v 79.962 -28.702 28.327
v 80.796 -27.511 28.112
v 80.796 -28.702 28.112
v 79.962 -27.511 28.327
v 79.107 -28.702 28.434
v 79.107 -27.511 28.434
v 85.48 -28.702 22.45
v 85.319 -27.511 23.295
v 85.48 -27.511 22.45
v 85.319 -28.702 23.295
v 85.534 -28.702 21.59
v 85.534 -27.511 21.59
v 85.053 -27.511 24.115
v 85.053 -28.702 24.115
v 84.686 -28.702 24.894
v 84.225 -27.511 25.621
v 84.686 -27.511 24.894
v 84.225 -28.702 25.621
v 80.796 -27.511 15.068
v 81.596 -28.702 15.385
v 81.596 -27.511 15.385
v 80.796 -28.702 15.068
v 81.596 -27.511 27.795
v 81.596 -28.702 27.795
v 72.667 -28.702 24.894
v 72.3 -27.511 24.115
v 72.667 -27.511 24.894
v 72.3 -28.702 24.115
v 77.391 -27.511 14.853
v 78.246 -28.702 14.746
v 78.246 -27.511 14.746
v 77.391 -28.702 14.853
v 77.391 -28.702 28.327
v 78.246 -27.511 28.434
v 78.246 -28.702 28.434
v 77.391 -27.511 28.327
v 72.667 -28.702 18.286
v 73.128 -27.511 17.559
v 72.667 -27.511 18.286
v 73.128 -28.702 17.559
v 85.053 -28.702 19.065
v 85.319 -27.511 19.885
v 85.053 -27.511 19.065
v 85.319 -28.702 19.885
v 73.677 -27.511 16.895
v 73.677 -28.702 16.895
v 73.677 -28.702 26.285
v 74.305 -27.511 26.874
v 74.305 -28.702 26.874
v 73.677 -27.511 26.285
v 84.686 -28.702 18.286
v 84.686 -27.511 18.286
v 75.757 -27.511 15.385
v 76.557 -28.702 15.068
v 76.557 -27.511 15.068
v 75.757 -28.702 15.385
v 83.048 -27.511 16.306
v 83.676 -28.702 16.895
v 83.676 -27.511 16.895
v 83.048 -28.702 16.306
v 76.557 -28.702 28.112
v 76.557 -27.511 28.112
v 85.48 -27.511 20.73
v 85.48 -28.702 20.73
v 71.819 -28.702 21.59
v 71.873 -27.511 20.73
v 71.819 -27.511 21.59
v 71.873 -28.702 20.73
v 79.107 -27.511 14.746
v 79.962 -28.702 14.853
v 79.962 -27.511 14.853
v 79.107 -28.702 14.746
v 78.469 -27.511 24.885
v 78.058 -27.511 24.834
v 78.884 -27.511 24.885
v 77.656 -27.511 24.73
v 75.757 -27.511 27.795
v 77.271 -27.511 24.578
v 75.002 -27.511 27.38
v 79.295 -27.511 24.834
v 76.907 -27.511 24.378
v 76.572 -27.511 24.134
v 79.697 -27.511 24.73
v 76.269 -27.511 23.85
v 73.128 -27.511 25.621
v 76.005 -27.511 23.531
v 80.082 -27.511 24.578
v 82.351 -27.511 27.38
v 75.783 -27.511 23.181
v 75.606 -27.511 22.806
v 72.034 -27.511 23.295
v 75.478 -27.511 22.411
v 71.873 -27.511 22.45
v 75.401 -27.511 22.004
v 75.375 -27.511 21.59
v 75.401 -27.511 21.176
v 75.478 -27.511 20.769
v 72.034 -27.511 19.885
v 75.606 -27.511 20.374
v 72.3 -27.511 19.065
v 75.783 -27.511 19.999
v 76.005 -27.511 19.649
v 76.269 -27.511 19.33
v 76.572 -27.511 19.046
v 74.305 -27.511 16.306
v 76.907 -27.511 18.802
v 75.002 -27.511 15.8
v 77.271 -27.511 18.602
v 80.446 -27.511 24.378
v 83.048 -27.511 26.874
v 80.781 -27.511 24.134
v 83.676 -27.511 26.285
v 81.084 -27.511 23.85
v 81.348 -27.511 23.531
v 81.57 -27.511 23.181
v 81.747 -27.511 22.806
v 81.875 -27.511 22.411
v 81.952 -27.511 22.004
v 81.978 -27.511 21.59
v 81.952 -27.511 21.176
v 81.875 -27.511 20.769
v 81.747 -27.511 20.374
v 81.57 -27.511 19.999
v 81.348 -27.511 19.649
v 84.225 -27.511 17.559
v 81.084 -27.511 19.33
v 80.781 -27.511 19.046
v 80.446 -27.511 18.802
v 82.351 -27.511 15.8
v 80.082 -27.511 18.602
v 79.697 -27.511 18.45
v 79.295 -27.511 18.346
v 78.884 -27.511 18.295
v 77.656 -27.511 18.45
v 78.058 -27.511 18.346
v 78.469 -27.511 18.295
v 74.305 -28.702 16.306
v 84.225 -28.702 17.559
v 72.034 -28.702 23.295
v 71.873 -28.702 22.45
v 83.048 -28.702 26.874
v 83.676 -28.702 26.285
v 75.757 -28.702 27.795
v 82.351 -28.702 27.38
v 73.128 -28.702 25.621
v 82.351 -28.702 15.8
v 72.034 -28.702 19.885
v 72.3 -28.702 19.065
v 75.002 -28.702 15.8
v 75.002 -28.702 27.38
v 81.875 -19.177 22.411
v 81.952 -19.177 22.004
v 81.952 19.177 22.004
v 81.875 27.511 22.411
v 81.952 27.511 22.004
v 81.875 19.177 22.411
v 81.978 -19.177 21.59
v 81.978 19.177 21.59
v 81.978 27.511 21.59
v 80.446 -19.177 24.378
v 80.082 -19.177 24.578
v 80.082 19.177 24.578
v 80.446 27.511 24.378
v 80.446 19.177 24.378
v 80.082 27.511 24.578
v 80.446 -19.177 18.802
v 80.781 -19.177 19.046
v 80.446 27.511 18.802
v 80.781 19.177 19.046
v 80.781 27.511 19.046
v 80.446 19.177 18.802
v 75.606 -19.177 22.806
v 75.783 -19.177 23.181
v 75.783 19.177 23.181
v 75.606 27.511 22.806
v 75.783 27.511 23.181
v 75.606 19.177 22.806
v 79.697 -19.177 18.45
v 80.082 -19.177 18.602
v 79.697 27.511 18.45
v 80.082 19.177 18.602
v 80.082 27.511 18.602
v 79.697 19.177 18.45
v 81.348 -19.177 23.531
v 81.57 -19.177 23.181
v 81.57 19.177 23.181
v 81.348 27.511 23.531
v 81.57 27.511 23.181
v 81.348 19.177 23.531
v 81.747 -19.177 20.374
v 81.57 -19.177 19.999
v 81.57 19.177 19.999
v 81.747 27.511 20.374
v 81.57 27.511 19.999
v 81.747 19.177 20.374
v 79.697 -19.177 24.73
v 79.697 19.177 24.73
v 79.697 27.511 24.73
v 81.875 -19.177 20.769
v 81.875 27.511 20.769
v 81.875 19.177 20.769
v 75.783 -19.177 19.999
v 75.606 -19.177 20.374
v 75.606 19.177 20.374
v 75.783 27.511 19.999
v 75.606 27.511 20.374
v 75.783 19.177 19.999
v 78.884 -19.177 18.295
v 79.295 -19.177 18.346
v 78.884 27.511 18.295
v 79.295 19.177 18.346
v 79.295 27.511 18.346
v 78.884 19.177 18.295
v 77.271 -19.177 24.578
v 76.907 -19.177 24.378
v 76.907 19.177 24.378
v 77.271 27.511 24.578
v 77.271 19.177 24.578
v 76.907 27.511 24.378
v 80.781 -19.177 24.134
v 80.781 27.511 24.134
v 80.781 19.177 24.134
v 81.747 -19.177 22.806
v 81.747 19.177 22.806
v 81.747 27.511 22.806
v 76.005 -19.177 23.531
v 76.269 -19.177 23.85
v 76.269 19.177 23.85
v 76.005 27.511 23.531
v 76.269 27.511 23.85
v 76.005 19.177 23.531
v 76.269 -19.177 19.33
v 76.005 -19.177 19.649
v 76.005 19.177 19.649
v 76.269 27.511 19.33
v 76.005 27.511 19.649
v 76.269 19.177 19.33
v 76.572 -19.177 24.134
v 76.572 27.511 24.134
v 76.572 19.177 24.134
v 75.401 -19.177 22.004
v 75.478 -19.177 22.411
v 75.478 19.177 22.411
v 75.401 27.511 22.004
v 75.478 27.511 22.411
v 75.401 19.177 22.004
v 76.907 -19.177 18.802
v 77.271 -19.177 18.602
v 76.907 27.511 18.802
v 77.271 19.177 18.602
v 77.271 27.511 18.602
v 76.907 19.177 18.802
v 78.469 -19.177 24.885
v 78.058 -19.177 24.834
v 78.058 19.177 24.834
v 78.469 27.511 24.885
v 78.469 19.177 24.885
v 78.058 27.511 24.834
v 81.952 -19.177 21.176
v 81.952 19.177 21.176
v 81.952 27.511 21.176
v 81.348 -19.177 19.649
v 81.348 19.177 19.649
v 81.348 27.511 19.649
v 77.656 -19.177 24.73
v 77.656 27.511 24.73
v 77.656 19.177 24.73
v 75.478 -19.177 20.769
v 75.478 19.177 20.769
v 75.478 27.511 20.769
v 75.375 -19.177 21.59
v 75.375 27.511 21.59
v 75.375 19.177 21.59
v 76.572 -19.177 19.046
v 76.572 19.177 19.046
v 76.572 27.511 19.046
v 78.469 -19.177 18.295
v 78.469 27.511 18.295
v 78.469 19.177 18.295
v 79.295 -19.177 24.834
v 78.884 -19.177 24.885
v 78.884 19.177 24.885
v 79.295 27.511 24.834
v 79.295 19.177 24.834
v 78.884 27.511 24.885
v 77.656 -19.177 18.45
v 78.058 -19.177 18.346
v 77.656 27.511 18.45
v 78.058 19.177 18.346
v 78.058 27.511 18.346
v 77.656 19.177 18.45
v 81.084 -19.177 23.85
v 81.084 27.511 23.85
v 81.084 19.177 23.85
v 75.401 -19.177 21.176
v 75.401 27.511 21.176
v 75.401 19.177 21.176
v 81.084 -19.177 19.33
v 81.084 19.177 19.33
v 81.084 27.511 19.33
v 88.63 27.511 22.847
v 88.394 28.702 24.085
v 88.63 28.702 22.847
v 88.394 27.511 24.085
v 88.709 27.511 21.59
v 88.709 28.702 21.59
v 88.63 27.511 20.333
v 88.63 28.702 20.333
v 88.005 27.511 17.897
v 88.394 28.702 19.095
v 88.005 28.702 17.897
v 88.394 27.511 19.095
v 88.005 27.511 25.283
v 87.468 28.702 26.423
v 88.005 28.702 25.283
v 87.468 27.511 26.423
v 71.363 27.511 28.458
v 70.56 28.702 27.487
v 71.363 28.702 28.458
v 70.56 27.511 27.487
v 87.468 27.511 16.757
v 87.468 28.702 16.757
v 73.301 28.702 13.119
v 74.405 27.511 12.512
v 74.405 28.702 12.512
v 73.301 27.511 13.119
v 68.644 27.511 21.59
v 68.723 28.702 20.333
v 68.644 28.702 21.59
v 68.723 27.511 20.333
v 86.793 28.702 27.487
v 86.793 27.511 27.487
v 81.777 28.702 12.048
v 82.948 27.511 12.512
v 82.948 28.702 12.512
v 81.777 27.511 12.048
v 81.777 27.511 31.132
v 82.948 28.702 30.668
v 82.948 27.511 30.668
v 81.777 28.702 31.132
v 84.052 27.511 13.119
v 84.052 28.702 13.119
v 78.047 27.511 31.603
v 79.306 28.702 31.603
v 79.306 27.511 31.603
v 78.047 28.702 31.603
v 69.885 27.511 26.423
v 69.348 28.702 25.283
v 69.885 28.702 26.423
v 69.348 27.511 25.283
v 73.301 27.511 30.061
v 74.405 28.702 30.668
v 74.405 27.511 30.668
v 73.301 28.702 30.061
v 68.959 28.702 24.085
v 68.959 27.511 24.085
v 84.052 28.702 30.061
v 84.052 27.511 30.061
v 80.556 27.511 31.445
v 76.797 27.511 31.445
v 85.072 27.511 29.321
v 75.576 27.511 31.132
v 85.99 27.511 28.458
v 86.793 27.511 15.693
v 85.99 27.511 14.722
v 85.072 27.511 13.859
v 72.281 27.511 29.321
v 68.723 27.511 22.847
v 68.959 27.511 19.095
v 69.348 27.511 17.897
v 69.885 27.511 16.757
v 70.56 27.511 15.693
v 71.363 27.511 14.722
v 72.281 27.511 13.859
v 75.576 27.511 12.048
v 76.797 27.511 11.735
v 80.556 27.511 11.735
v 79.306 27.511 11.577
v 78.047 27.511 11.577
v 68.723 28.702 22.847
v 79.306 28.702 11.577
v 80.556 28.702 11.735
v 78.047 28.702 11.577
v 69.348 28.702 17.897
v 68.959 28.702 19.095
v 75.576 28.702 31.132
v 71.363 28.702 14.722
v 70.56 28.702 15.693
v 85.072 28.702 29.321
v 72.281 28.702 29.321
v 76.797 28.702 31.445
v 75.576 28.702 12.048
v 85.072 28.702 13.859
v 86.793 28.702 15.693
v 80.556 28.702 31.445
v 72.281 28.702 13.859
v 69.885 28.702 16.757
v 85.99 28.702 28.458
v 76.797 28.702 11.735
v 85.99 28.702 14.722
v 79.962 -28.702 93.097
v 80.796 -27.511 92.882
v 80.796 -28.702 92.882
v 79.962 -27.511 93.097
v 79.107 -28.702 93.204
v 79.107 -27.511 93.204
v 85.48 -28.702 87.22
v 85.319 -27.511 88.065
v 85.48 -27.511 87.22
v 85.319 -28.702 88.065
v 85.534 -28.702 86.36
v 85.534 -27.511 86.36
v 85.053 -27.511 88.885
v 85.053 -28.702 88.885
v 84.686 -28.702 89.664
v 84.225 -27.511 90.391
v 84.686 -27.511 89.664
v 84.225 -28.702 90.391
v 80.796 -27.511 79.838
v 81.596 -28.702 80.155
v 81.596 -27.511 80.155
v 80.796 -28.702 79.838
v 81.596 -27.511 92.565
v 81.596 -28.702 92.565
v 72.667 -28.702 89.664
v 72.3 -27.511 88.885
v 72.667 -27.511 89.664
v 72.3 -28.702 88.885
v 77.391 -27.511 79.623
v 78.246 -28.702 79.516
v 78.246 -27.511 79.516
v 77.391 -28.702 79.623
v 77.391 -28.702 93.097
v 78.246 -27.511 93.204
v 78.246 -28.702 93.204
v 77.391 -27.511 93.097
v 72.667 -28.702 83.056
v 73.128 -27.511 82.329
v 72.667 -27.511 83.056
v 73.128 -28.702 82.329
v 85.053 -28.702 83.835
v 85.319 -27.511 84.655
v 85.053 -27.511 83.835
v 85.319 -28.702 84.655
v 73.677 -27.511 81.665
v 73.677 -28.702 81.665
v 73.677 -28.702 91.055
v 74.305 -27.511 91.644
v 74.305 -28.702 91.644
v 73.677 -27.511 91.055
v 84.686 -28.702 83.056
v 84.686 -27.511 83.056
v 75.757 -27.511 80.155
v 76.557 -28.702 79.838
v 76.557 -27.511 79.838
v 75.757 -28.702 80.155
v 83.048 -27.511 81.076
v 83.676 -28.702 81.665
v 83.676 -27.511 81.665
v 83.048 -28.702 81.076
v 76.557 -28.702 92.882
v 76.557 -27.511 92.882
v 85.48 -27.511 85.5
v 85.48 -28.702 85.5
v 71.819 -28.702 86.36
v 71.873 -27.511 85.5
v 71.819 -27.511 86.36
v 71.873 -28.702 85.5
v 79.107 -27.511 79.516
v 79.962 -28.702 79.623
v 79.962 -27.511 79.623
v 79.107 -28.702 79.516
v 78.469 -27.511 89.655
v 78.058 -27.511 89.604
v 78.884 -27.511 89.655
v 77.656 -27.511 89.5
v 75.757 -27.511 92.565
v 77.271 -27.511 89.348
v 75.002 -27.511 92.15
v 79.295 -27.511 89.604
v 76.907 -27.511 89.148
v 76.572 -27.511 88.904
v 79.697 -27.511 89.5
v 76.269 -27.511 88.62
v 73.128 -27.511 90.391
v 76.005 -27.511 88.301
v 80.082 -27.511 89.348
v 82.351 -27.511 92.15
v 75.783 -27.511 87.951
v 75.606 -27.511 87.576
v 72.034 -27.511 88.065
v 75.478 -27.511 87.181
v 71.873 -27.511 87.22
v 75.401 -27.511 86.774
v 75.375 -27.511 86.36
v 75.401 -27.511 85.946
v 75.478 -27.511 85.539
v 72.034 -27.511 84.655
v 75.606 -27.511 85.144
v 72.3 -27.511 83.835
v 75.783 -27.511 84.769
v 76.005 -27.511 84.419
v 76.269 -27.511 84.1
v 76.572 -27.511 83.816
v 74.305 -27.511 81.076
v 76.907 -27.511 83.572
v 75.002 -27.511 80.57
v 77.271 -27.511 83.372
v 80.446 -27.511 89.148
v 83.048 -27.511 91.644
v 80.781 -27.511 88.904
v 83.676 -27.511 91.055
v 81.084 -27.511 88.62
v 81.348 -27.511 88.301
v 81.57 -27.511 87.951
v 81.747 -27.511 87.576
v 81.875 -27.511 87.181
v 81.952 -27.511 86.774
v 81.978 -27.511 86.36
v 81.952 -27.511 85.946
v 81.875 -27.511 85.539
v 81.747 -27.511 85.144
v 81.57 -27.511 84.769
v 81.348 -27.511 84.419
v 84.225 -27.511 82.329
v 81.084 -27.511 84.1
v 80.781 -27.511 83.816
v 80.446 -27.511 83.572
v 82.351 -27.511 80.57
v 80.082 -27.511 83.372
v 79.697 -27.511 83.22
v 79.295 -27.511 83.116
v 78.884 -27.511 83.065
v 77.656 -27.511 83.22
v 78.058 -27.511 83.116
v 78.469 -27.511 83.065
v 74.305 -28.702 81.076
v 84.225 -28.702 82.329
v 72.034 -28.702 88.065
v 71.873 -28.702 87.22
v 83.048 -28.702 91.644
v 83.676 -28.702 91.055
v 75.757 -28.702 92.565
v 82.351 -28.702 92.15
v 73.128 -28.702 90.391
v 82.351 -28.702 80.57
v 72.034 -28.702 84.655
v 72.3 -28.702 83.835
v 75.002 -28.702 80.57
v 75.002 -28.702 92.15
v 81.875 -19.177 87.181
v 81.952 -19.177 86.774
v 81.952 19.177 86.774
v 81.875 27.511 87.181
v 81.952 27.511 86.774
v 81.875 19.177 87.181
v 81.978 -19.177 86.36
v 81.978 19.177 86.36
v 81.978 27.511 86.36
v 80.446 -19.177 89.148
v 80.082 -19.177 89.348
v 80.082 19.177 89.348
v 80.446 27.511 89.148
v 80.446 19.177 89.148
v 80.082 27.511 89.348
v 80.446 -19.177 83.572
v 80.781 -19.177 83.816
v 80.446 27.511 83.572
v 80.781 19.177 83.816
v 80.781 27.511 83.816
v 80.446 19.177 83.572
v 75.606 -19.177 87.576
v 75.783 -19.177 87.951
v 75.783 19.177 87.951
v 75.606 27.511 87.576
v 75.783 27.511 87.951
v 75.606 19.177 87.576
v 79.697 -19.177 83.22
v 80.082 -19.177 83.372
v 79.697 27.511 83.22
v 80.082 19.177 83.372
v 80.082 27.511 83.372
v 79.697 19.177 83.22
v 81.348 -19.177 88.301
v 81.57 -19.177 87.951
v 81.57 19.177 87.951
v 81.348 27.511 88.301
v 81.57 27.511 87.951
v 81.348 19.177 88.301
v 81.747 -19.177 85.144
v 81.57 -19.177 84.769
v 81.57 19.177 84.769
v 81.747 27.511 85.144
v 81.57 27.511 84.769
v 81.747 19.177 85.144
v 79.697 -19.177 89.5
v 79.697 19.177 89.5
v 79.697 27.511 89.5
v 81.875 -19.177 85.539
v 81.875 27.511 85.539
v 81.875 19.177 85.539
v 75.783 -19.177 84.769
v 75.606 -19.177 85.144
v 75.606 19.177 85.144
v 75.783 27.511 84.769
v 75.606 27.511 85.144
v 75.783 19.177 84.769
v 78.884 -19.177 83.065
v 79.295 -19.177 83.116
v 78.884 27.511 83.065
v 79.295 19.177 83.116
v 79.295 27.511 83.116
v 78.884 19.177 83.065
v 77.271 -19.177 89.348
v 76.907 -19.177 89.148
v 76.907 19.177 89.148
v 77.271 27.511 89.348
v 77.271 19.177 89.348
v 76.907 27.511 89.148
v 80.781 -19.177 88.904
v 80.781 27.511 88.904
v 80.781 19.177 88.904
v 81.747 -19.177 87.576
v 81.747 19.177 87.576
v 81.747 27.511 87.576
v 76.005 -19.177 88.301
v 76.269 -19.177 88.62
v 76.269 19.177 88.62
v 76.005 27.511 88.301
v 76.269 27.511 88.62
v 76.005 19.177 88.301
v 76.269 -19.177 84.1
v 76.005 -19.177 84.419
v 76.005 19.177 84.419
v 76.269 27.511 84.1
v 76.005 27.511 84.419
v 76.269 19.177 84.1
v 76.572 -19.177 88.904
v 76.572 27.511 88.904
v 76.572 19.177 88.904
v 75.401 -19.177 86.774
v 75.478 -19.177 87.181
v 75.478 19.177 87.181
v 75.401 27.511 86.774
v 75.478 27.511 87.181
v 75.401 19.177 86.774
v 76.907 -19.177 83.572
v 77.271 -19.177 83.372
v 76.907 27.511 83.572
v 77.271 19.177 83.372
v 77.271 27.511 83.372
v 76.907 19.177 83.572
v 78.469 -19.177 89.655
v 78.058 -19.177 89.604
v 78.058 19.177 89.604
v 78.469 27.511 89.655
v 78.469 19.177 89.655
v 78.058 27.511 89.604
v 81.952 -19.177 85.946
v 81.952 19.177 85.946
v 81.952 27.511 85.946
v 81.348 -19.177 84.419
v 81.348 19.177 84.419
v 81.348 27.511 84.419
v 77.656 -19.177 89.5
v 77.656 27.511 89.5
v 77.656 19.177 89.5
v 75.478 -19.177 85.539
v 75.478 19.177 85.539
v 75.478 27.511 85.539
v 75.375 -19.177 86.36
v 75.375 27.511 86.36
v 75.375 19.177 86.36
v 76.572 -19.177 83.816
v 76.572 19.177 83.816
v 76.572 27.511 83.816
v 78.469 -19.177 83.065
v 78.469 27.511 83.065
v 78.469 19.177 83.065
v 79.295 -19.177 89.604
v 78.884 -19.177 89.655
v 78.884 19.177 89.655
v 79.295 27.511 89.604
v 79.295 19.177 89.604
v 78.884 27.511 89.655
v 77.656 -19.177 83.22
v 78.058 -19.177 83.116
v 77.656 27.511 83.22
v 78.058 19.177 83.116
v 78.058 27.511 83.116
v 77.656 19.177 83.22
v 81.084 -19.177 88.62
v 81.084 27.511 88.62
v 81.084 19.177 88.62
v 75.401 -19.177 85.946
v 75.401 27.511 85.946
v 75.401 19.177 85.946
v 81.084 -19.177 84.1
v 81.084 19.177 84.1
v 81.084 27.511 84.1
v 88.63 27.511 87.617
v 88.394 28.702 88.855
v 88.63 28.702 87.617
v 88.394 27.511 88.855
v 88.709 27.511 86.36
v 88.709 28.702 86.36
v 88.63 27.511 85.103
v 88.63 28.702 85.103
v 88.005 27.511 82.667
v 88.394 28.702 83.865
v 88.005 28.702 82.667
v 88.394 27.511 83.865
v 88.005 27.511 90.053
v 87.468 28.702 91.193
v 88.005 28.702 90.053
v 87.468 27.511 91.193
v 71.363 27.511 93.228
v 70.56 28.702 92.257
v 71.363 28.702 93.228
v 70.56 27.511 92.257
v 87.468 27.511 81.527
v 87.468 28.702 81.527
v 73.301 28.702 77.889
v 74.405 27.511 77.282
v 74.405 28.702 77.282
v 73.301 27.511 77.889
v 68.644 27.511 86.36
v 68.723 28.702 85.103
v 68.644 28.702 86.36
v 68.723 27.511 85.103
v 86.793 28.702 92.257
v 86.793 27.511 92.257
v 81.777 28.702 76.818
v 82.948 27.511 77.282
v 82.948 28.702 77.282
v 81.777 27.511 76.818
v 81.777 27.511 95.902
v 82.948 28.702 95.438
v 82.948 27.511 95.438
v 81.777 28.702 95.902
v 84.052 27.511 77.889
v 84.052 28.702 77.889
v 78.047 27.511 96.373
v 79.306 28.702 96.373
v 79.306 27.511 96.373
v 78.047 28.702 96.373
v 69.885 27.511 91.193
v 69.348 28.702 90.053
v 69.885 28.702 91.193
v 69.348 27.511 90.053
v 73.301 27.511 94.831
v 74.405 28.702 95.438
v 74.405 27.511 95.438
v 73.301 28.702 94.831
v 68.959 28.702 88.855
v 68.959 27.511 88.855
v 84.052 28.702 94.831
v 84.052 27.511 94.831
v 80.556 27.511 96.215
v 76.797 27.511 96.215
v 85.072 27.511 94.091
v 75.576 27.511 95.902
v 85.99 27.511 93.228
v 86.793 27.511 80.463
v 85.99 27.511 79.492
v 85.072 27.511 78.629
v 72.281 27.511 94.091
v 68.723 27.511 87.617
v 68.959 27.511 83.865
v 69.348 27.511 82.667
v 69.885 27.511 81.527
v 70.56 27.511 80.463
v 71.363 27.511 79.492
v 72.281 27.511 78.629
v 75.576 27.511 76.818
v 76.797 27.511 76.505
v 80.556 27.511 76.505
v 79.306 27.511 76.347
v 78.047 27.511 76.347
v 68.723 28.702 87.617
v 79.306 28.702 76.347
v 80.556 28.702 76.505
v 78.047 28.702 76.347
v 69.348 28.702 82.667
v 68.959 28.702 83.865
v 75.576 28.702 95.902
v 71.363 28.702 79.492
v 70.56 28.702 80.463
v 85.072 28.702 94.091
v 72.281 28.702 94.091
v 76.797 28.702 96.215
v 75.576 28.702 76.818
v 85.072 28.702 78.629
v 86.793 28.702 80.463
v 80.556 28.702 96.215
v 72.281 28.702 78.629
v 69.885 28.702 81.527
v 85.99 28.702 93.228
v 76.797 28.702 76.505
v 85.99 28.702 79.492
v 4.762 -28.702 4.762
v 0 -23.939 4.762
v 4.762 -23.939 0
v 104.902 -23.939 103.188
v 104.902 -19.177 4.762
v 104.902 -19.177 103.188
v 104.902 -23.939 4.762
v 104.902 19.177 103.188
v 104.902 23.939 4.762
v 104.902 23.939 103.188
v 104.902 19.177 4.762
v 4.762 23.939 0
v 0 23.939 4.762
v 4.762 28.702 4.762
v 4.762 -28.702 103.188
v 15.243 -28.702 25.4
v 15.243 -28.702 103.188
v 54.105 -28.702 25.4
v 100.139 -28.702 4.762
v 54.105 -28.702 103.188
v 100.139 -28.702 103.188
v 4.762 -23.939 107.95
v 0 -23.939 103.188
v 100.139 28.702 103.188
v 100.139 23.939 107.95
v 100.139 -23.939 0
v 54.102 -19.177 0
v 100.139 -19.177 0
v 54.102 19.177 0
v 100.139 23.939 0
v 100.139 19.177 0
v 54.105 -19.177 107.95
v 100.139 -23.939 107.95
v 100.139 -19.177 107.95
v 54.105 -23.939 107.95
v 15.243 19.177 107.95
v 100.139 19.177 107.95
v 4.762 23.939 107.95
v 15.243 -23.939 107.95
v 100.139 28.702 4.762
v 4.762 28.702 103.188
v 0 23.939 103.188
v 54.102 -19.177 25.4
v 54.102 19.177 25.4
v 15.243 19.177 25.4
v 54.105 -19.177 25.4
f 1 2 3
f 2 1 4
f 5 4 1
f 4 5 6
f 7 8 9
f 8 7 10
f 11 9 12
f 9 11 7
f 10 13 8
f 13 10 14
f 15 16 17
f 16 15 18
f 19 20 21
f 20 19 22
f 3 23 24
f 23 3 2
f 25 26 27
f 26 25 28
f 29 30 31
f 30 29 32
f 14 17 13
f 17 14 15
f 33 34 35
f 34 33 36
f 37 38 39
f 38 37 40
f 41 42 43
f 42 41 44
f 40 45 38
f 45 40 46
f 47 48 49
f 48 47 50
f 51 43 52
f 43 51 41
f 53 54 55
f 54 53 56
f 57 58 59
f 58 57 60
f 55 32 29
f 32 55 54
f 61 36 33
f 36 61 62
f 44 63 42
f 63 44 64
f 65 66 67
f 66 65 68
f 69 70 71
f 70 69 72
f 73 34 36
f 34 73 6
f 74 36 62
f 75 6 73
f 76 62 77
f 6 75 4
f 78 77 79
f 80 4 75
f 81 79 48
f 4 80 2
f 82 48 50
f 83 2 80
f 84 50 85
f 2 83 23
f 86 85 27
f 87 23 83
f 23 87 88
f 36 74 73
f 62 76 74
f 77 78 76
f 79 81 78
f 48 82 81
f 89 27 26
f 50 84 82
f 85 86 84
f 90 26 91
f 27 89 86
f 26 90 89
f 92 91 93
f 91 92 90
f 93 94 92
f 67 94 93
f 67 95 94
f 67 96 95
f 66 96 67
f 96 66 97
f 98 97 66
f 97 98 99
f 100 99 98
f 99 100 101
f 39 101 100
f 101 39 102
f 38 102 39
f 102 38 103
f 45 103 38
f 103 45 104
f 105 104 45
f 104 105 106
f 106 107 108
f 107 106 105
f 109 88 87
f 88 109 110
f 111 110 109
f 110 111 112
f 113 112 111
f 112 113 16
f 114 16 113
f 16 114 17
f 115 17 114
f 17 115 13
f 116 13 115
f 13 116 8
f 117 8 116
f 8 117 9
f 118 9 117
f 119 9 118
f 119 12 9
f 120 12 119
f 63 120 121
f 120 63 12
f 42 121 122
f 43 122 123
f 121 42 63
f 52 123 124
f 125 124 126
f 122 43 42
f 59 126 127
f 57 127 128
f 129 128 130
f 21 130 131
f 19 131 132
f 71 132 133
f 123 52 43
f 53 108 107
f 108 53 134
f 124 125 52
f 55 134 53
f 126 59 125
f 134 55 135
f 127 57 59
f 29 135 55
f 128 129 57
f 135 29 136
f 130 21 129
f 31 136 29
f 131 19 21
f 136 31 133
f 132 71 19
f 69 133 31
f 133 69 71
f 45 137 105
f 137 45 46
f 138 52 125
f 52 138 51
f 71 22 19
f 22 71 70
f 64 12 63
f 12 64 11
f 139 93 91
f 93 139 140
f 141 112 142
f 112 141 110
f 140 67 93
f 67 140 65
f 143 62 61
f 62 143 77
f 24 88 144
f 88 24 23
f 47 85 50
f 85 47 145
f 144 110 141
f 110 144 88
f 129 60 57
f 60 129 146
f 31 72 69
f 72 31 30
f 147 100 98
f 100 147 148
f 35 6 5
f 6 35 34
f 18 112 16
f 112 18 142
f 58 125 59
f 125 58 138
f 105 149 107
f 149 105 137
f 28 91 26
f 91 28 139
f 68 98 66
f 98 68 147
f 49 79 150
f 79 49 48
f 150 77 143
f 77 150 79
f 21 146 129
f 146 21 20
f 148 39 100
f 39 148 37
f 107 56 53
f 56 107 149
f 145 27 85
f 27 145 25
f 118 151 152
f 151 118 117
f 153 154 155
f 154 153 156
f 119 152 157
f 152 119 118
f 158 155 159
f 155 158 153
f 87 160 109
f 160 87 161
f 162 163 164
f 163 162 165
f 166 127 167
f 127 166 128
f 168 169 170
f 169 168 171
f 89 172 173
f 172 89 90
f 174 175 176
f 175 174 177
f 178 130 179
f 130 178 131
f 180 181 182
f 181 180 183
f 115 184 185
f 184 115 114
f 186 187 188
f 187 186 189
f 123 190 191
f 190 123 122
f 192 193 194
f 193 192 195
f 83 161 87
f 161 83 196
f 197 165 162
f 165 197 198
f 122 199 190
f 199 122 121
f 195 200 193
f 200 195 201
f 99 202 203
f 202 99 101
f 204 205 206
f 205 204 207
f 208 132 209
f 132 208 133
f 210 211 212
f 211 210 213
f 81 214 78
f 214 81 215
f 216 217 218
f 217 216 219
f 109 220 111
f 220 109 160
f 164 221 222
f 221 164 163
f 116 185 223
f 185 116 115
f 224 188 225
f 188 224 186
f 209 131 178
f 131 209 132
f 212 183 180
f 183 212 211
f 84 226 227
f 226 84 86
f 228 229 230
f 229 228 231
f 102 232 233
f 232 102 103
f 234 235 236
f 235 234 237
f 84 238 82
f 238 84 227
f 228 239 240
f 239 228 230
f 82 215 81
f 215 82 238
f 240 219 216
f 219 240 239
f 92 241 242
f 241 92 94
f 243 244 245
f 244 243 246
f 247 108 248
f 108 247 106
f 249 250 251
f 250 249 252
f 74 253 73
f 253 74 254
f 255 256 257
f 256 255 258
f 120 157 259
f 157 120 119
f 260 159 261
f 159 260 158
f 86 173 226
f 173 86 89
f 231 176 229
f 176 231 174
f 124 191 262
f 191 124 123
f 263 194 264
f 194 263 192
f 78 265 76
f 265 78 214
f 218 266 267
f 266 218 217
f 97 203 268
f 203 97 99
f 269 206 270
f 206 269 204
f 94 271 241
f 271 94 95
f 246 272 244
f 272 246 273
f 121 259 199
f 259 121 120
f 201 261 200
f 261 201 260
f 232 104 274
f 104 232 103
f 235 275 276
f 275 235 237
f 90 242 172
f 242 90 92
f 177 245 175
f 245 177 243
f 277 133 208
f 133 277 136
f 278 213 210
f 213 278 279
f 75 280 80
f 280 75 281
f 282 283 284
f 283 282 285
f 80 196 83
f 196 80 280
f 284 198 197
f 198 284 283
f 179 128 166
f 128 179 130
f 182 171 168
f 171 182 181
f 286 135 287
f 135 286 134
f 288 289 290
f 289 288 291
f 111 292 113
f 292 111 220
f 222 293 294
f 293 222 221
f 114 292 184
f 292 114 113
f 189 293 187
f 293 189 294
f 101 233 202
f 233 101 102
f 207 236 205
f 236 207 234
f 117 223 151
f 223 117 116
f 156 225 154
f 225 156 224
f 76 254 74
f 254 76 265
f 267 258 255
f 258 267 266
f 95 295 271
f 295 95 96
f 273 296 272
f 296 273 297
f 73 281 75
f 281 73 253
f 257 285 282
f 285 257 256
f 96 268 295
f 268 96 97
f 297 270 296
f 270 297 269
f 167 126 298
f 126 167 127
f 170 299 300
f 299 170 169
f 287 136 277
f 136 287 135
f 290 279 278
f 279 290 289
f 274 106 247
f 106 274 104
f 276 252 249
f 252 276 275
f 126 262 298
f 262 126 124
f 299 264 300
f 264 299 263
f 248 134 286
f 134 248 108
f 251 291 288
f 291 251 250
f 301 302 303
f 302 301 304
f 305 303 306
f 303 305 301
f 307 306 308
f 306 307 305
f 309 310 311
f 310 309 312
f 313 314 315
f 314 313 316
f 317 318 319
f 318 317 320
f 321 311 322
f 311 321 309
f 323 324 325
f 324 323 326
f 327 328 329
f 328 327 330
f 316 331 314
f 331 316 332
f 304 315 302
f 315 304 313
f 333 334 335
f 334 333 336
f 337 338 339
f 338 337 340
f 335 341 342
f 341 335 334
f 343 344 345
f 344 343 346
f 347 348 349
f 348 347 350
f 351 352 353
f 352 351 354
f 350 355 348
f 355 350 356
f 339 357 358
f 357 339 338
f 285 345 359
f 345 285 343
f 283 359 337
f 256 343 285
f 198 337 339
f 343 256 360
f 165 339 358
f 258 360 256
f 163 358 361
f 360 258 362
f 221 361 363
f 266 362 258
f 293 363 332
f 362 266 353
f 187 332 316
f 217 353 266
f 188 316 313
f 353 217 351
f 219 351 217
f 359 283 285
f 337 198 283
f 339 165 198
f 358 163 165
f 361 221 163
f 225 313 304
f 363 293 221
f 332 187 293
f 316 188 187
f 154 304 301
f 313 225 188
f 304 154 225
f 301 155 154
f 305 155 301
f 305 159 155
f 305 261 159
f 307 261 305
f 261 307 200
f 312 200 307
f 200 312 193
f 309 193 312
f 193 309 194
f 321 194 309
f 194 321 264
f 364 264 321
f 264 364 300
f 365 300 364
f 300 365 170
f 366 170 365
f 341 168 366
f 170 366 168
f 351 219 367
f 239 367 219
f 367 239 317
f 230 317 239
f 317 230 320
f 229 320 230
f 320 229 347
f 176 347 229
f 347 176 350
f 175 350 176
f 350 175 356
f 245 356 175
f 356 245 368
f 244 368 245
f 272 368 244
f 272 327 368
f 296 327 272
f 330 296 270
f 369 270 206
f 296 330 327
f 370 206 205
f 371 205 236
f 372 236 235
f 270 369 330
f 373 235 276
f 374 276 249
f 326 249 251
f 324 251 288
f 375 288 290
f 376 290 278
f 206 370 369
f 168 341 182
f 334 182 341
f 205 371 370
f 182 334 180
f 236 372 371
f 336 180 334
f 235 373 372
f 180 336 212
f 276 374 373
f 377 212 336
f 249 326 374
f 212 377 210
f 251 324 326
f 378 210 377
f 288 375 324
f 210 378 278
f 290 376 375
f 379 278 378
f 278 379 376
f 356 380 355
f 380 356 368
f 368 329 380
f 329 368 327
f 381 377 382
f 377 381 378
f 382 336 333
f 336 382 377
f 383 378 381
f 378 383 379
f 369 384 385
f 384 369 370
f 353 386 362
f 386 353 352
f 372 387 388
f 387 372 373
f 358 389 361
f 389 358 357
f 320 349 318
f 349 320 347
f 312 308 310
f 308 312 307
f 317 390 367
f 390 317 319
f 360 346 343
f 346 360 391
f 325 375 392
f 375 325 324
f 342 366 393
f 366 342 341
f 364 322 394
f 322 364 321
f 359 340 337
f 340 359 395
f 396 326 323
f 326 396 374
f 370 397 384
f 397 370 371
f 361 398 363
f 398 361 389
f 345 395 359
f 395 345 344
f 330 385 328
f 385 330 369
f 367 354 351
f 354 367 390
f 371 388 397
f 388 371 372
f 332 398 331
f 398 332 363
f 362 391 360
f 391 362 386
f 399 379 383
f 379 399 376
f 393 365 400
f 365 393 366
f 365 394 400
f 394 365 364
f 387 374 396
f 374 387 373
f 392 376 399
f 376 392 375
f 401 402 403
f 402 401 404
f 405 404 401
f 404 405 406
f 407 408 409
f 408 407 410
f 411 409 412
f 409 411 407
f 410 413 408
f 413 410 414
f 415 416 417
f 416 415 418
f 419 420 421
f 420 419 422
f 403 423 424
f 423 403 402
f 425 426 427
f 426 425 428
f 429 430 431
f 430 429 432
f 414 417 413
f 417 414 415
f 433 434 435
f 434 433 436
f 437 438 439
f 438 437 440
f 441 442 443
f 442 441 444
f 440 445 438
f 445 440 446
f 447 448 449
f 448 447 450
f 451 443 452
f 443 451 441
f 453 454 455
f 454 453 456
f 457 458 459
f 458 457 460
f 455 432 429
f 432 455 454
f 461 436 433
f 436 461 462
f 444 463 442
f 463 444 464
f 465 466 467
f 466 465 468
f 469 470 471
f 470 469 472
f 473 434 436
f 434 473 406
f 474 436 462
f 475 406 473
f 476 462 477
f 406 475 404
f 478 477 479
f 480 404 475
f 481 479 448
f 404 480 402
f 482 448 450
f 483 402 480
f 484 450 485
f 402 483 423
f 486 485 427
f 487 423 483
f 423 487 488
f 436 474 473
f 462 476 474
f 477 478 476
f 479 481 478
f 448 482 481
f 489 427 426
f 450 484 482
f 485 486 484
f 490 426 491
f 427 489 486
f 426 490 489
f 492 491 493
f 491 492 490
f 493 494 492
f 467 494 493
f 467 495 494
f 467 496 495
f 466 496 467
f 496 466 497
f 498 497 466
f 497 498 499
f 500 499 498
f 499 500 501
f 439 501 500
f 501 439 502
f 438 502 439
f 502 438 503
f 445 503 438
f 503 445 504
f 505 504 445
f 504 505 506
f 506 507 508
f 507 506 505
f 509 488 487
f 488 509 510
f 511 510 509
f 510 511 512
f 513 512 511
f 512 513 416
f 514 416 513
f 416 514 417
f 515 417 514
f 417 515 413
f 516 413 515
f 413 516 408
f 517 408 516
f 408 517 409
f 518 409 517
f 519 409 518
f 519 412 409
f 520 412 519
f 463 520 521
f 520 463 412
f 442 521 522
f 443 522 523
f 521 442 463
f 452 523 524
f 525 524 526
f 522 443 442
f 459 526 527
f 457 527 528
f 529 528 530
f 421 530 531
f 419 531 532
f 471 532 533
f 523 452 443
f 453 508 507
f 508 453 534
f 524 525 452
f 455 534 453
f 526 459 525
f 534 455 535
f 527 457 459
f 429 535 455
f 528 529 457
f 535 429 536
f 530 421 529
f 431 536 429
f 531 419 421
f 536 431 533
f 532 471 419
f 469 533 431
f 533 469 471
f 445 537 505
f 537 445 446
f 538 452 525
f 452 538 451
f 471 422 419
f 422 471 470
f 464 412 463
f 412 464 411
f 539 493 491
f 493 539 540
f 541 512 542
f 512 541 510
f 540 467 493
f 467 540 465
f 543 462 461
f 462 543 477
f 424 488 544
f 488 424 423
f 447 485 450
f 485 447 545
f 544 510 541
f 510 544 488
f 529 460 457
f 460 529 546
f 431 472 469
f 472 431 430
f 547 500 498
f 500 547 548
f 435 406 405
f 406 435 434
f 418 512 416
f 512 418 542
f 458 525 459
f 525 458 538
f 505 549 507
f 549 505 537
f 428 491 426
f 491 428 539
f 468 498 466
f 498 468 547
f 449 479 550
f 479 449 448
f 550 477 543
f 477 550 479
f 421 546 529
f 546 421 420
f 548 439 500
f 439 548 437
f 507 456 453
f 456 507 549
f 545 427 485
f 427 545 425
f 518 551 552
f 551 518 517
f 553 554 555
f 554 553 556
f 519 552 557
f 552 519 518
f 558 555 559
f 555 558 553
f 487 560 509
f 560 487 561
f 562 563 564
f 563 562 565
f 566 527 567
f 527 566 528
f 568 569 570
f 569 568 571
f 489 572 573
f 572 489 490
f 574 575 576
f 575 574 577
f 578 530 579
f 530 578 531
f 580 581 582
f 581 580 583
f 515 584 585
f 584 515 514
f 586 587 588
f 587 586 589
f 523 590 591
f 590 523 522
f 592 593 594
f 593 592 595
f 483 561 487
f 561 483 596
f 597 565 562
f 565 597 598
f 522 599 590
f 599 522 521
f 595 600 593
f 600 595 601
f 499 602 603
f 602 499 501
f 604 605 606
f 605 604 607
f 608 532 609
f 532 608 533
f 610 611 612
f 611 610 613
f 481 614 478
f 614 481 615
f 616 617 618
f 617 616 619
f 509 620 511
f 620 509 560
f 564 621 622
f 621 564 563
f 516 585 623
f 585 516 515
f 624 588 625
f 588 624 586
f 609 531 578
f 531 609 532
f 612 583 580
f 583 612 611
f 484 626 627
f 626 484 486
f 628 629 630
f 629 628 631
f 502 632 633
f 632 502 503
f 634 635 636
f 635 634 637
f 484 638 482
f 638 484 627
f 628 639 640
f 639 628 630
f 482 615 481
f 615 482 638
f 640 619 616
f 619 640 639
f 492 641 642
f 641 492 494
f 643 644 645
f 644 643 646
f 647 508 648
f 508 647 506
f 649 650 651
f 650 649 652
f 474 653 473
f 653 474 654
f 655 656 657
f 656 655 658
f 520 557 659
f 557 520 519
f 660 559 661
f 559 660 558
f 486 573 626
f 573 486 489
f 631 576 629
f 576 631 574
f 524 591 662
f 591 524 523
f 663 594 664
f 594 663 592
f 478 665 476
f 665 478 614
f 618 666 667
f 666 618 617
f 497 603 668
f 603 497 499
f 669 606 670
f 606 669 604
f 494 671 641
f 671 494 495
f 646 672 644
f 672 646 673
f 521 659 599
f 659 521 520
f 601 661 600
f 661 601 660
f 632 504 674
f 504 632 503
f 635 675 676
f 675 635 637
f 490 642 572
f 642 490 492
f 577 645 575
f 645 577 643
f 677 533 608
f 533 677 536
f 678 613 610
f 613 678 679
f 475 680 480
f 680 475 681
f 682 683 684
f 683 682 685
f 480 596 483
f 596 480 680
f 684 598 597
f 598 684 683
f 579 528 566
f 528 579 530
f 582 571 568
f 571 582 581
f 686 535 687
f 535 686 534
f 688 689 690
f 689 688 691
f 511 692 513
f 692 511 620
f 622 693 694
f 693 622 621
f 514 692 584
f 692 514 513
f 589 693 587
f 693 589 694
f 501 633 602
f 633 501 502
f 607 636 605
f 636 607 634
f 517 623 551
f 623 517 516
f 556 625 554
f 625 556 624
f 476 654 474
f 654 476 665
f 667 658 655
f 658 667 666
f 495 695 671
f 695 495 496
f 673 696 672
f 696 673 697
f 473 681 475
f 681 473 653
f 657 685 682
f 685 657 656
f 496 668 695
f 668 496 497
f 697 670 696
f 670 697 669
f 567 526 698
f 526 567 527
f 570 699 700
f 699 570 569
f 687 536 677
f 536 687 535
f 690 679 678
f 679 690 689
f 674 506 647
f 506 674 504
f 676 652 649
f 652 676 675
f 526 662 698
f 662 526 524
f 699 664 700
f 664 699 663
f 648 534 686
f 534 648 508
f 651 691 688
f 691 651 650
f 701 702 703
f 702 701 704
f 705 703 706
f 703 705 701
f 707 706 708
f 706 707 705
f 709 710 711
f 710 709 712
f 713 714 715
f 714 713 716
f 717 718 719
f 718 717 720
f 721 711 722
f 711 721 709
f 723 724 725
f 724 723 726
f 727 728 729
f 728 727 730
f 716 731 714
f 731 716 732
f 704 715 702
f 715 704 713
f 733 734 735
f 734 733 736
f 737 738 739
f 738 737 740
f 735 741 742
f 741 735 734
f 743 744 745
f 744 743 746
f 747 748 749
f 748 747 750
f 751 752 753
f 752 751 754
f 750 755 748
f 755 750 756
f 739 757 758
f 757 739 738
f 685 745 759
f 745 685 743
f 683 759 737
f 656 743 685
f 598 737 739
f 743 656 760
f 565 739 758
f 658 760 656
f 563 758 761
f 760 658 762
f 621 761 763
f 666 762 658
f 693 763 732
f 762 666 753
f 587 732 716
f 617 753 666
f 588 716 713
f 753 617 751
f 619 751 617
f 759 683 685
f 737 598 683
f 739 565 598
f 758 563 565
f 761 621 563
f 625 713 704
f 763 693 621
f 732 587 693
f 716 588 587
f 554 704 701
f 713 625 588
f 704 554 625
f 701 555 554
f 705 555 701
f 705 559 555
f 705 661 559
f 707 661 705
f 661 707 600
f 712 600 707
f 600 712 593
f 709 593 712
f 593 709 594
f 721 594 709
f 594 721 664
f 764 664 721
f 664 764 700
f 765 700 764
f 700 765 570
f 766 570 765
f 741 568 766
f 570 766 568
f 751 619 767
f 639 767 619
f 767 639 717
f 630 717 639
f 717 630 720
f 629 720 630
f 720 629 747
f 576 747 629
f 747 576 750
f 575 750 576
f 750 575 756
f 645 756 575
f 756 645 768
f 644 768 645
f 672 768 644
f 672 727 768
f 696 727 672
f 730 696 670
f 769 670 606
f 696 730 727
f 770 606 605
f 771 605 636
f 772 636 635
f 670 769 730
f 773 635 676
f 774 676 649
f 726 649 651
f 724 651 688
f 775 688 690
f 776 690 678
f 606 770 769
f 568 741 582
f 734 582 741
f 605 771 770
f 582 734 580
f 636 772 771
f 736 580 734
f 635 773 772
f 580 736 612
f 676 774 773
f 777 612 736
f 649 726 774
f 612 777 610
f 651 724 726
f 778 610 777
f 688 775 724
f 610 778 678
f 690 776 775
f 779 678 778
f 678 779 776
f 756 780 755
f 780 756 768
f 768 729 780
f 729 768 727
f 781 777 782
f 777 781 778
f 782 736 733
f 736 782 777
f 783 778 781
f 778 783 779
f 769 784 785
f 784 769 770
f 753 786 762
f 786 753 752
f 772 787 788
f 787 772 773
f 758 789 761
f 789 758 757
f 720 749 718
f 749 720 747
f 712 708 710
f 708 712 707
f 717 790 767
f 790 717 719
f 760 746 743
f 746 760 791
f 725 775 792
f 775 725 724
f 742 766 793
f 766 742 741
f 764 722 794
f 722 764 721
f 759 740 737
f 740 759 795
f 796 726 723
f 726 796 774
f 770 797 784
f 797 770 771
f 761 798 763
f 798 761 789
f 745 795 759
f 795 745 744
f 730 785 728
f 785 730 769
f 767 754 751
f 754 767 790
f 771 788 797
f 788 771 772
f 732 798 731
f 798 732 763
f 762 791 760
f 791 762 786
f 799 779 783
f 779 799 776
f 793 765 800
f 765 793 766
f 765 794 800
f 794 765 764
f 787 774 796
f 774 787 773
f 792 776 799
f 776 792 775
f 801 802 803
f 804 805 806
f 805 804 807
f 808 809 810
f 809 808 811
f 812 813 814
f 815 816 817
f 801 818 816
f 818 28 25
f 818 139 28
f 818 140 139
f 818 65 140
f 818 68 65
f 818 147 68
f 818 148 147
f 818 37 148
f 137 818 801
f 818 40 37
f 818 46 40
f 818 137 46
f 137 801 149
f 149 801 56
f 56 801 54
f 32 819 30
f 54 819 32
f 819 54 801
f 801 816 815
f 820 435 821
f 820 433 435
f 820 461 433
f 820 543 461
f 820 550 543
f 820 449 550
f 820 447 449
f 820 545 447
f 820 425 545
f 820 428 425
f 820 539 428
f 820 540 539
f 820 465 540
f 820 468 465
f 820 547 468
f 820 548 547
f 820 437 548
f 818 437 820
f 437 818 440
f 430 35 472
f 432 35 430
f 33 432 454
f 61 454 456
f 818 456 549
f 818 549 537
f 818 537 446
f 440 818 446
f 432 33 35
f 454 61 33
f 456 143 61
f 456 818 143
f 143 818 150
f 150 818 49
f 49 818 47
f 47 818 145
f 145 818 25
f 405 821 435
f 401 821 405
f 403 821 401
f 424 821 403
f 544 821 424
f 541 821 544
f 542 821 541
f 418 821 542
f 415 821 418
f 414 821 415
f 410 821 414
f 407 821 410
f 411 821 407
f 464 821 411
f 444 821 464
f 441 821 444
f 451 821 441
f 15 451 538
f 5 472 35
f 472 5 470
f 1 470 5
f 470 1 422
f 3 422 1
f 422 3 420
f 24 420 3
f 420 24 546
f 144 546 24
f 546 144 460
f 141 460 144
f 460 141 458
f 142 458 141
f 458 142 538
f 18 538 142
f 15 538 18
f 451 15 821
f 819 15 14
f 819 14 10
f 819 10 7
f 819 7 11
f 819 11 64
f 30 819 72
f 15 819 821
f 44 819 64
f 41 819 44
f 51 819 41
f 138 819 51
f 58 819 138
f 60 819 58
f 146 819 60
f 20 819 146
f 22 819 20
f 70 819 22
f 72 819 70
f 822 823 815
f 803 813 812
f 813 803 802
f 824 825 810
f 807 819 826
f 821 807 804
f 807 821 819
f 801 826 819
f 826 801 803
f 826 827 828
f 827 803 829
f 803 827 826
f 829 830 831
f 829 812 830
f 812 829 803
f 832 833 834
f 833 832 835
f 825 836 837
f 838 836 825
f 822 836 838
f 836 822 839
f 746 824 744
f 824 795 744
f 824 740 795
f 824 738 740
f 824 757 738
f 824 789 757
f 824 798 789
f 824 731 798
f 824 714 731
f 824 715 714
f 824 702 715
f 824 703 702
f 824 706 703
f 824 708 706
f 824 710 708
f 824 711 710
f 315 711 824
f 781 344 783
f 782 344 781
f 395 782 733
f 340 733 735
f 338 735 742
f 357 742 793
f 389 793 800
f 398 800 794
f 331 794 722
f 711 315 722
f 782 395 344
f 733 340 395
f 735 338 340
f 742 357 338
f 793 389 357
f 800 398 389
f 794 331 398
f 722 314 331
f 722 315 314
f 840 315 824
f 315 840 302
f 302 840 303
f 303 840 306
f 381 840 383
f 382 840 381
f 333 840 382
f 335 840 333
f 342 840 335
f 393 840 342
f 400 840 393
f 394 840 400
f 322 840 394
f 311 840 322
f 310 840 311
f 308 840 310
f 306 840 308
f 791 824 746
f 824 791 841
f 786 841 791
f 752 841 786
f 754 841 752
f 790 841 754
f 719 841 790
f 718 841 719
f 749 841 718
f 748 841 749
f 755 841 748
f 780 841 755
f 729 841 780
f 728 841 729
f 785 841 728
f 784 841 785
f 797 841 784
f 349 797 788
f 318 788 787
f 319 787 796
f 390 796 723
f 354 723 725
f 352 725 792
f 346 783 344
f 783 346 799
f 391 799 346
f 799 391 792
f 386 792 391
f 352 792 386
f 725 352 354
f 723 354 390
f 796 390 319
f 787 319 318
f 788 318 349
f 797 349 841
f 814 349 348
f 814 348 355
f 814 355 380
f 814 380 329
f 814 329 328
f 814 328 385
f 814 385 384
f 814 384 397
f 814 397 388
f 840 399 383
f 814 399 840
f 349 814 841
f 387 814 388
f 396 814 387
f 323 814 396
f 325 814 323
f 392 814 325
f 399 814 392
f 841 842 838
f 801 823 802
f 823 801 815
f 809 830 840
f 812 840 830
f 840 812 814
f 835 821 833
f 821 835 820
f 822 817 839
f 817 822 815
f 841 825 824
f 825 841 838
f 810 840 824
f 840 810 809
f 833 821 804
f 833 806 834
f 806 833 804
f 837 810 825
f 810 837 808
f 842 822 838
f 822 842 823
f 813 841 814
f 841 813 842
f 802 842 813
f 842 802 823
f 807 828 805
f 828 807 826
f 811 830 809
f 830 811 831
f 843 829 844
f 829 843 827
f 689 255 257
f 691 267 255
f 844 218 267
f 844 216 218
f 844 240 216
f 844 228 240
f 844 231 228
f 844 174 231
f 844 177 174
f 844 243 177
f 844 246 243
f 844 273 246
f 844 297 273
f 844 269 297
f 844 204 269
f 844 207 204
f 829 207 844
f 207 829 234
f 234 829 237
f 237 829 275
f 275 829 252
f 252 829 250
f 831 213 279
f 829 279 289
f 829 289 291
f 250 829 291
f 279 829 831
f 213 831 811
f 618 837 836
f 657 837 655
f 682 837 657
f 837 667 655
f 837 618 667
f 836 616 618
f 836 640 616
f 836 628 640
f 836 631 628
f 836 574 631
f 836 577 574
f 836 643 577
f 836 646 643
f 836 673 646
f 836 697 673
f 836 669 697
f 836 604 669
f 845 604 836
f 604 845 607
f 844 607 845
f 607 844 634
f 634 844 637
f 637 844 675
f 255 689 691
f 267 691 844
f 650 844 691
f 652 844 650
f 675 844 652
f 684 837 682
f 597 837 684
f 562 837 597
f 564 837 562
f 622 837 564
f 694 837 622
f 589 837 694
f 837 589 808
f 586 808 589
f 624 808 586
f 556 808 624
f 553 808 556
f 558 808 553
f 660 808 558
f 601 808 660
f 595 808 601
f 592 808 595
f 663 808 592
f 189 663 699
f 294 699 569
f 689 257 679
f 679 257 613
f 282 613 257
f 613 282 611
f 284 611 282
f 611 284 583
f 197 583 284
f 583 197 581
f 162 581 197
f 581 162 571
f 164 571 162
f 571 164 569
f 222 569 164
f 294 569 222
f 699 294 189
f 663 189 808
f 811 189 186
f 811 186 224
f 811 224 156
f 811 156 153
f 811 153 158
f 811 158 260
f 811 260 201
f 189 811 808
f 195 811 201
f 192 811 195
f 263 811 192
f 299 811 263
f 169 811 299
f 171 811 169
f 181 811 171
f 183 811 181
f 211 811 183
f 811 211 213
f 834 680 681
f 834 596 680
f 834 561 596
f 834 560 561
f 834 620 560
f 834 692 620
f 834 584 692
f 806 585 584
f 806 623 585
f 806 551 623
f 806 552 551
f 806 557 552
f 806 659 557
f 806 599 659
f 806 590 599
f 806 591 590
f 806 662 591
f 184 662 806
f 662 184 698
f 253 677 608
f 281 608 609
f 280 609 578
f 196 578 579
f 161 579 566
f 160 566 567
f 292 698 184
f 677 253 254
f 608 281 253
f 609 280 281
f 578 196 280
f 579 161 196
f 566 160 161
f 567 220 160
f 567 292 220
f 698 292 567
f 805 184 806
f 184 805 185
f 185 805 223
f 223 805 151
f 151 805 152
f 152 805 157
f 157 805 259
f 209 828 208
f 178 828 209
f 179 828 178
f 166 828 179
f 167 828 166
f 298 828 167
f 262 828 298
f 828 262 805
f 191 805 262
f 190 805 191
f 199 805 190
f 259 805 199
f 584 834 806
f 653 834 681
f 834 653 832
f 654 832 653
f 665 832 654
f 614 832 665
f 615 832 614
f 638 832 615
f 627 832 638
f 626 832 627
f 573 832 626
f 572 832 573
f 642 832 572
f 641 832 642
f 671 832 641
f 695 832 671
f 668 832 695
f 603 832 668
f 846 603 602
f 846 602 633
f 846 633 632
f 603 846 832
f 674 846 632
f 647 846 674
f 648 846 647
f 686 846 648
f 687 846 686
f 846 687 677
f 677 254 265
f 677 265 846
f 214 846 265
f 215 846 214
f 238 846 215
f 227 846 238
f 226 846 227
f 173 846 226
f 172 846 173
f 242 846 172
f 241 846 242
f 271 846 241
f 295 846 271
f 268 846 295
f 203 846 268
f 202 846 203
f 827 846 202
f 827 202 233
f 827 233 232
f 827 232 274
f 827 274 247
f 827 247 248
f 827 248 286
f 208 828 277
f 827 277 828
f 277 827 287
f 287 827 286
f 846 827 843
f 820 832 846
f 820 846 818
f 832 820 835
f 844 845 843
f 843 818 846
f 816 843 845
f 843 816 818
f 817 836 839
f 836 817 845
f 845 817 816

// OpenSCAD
tight = 0.01;
slack = 0.03;
plate_thickness = 3/8;
bottom_height = 1;
finger_thickness = 0.6;

length = 2 + 1.5 + finger_thickness + slack;
width = 1.5 + tight + 2*plate_thickness;
height = 3.25 + bottom_height;

head_countersink_diameter = 0.54;
tail_countersink_diameter = 0.79;
countersink_depth = 3/64;
hole_diameter = 0.26;

module octahedron(major_radius=1) {
  // Top and bottom halves.
  for (a = [-1, 1])
    scale([1, 1, a])
      // Extrude a square into a pyramid.
      linear_extrude(major_radius, scale=0)
        rotate([0, 0, 45])
          square(sqrt(2)*major_radius, center=true);
}

module chamfered_cube(dims, chamfer=1) {
  assert(dims.x >= 2*chamfer);
  assert(dims.y >= 2*chamfer);
  assert(dims.z >= 2*chamfer);

  hull()
    for (a = [0, 1], b = [0, 1], c = [0, 1])
        translate([
          (dims.x - 2*chamfer) * a + chamfer,
          (dims.y - 2*chamfer) * b + chamfer,
          (dims.z - 2*chamfer) * c + chamfer
        ])
          octahedron(chamfer);
}

$fn = 50;

module bracket() {
  difference() {
    translate([0, -width/2, 0])
      chamfered_cube([length, width, height], 3/16);
    
    // Vertical.
    translate([5 + finger_thickness + 1.5 + slack, 0, 0])
      cube([10, 1.5 + tight, 10], center=true);
    
    // Rail.
    translate([finger_thickness + 0.0001, -10 + 1.5/2 + tight/2, bottom_height])
      cube([1.5 + slack, 10, 10]);
    
    // Countersink.
    for (a = [0.2, 0.8]) {
      translate([length*0.75, -width/2, a*height]) {
        rotate([90, 0, 0]) {
          // Head countersink.
          translate([0, 0, -countersink_depth])
            cylinder(1, d=head_countersink_diameter);
          
          // Bolt countersink.
          translate([0, 0, -10])
            cylinder(20, d=hole_diameter);
          
          // Tail countersink.
          translate([0, 0, -1 + countersink_depth - width])
            cylinder(1, d=tail_countersink_diameter);
        }
      }
    }
  }
}

module print() {
  // Convert from inches to millimeters.
  scale([1, 1, 1] * 25.4)
    bracket();
}

print();
